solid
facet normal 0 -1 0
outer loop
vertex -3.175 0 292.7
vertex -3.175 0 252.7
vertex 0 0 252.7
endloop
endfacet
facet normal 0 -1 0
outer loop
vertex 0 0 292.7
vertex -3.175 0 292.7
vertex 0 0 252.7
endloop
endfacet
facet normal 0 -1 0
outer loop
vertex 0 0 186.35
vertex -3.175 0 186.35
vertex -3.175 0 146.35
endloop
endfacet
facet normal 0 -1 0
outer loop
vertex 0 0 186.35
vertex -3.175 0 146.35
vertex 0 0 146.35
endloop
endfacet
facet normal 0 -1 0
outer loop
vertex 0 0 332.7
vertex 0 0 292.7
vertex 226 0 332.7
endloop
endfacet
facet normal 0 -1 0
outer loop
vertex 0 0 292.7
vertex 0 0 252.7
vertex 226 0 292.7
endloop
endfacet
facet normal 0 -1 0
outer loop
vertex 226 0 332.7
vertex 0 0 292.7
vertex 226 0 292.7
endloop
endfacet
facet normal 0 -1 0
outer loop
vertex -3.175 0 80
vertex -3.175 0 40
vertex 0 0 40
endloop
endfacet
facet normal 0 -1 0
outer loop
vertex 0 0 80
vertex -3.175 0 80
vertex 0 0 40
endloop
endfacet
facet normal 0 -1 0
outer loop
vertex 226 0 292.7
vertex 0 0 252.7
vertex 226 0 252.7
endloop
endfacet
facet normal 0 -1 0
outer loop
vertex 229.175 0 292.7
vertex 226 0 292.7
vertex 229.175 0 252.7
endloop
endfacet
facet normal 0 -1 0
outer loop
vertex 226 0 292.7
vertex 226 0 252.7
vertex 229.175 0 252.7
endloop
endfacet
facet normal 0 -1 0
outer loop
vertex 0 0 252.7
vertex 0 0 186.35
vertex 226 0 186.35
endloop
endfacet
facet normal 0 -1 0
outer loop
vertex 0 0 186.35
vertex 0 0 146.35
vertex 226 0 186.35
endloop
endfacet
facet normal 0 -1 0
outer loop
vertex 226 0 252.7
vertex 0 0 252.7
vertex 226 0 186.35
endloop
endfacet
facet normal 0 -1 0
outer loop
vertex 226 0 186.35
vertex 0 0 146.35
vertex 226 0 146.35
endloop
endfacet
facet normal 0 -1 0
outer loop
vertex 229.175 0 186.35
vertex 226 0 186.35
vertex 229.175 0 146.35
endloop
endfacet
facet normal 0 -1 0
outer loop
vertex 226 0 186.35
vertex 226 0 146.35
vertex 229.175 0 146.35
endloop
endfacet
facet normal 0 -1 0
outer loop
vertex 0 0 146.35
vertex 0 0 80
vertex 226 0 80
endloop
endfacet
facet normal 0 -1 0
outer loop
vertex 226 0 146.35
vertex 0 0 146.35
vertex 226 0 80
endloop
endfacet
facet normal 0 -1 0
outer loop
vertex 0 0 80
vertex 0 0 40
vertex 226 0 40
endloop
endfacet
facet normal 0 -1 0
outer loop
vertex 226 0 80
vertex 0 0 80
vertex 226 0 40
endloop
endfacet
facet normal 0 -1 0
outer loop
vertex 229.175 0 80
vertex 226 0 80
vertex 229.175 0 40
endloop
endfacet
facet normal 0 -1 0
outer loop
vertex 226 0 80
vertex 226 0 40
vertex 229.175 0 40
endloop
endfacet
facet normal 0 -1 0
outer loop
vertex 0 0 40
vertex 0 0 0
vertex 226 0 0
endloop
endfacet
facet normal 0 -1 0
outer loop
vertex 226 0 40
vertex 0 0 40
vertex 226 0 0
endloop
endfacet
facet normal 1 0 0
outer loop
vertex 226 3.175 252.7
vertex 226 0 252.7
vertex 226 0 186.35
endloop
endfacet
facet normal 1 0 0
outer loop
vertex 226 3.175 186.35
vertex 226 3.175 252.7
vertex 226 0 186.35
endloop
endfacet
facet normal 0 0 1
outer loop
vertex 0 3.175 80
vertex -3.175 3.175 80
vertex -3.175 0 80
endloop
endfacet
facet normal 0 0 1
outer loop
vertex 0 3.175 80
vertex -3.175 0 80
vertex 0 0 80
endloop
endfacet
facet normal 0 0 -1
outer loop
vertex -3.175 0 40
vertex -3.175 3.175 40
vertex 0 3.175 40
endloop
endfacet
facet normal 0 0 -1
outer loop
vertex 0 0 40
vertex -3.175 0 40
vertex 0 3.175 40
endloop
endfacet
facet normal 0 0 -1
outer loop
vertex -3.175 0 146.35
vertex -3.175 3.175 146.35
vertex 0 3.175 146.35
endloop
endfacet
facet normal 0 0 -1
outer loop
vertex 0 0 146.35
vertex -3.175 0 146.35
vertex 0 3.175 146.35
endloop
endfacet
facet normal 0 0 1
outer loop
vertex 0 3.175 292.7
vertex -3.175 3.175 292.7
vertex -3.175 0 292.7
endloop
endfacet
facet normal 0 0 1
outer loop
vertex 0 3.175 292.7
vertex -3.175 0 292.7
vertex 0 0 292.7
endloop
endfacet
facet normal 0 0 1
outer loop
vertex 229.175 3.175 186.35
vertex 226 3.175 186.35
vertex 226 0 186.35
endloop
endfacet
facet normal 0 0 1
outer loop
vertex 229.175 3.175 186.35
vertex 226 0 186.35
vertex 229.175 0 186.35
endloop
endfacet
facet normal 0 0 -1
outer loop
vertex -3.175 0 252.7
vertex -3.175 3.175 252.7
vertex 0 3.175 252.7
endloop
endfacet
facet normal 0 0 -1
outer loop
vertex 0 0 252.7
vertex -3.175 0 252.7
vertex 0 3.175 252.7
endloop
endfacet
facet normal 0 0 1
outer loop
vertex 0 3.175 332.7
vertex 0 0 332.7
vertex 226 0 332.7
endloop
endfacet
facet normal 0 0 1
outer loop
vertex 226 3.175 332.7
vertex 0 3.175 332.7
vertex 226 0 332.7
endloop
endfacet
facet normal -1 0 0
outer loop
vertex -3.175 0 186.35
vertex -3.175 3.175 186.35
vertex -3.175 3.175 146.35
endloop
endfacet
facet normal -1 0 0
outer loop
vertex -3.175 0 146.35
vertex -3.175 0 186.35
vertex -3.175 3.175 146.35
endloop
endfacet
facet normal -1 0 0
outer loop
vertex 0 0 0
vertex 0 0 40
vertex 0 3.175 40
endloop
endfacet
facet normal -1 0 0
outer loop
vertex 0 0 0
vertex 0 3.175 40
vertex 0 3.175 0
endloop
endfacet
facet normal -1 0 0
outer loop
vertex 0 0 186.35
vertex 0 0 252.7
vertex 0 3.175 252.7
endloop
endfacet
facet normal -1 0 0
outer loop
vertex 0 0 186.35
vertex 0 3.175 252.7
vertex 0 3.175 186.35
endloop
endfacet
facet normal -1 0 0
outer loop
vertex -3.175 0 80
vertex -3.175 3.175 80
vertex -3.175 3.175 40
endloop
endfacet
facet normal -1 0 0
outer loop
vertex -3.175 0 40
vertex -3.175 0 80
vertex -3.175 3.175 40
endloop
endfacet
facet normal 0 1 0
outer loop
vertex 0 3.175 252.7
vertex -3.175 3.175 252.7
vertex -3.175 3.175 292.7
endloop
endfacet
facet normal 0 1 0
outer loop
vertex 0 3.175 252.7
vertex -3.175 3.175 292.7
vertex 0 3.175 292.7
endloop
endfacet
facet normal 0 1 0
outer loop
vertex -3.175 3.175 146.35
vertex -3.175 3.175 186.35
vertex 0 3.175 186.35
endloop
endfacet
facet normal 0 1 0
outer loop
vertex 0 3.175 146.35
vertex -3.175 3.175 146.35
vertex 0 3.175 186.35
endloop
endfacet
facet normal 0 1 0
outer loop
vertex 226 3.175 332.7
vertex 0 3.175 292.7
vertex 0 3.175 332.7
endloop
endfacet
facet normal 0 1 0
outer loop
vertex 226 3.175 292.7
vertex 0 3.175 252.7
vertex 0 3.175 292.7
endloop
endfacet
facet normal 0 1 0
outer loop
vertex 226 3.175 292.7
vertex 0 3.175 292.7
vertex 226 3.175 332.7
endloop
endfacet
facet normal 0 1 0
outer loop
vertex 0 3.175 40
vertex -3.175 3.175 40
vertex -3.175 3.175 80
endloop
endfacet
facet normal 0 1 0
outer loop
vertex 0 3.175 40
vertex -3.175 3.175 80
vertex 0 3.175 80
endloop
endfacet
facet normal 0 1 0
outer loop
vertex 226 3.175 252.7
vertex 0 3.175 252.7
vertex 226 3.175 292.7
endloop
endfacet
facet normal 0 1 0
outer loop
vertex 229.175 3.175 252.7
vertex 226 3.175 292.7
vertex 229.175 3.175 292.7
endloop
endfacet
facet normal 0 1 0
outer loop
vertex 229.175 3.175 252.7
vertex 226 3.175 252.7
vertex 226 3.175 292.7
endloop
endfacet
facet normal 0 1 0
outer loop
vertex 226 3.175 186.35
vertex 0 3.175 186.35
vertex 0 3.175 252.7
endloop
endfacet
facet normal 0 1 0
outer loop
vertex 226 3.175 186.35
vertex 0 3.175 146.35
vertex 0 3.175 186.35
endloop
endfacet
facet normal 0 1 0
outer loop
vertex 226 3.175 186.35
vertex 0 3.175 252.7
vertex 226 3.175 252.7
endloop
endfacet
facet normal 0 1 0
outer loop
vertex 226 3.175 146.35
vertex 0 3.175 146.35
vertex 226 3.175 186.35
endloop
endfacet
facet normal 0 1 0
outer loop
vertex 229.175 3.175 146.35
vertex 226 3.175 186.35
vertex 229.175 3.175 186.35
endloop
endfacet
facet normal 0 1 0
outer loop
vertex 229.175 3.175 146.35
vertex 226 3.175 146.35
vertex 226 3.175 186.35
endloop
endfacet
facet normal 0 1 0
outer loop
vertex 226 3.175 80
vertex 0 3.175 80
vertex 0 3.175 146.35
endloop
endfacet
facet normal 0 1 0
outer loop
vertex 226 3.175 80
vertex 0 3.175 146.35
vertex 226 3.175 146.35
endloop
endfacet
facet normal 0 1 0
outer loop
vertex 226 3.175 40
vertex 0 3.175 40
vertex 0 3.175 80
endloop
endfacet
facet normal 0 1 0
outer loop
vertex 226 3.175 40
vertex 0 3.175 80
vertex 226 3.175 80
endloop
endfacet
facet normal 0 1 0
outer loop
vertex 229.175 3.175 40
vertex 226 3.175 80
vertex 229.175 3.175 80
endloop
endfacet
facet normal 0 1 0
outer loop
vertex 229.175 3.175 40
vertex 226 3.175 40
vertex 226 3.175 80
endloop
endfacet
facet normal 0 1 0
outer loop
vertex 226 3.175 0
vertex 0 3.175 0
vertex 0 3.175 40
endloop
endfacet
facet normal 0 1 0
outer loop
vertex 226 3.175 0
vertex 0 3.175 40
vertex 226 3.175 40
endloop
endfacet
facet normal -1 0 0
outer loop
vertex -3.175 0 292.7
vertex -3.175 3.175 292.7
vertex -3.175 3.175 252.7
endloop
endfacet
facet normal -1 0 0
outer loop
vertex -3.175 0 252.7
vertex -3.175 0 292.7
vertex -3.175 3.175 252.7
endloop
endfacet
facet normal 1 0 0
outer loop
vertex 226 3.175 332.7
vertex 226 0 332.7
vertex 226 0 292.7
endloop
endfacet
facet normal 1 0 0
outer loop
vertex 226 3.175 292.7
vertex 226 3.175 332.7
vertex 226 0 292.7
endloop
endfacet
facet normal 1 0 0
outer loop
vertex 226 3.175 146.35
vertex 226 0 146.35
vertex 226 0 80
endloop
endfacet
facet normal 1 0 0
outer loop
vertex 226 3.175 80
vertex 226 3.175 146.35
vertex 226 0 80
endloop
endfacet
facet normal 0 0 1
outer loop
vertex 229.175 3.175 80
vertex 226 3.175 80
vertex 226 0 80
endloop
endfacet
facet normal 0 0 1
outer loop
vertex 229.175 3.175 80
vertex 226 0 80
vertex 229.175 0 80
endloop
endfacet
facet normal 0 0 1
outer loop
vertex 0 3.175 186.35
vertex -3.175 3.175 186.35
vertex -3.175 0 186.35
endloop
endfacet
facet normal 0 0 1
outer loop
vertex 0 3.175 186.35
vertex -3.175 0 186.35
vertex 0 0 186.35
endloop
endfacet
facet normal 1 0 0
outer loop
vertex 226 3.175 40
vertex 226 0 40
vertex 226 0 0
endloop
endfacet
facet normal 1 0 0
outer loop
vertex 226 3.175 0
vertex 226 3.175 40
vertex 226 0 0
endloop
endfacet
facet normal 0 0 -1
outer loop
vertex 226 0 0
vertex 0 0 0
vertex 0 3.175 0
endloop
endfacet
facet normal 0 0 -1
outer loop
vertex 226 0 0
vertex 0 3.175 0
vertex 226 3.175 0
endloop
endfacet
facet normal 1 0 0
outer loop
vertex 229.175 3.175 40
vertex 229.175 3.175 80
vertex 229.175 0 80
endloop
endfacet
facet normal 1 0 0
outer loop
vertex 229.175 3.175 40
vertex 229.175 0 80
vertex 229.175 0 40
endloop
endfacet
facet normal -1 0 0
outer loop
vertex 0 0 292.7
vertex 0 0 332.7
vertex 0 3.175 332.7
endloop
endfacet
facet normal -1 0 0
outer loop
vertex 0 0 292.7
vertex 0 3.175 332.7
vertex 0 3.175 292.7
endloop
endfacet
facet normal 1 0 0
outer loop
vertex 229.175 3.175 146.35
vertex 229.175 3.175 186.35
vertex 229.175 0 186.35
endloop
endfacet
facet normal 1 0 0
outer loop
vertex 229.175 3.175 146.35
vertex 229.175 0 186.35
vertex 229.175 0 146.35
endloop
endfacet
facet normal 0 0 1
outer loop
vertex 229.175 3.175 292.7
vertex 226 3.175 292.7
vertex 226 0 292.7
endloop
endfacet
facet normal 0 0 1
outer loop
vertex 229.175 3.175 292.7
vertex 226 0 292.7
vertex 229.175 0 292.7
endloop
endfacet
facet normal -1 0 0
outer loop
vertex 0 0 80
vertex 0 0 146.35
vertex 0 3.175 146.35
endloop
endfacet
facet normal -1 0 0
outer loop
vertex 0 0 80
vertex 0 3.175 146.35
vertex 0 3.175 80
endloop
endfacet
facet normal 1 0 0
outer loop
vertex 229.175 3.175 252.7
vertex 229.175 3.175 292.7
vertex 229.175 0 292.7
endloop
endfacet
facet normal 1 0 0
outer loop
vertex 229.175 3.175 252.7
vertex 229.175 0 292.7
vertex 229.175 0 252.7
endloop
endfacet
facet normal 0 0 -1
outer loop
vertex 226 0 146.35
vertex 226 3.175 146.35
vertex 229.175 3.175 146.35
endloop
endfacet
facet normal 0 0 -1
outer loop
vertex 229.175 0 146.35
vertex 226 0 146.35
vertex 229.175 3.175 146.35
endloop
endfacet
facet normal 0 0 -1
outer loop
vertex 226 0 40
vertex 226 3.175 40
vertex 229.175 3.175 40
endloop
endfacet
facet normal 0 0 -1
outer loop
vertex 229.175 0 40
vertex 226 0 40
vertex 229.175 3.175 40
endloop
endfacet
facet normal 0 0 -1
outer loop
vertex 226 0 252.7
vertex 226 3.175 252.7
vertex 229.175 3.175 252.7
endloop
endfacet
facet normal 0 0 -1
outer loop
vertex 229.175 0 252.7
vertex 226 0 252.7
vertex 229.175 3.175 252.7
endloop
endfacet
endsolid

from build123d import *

# Parameters (mm, degrees)
SKETCH1_W           = 226
SKETCH1_H           = 332.7
BOSS_EXTRUDE1_DEPTH = 3.175
SKETCH2_W           = 3.175
SKETCH2_H           = 40
BOSS_EXTRUDE2_DEPTH = 3.175
LPATTERN1_COUNT     = 3
LPATTERN1_PITCH     = 106.35


with BuildPart() as part:
    # Sketch1 → Boss-Extrude1 (new body)
    with BuildSketch(Plane(origin=(0, 0, 0), x_dir=(1, 0, 0), z_dir=(0, 1, 0))):
        with Locations((113, -166.35)):
            Rectangle(SKETCH1_W, SKETCH1_H)
    extrude(amount=BOSS_EXTRUDE1_DEPTH)

    # Sketch2 → Boss-Extrude2 (add)
    with BuildSketch(Plane(origin=(0, 3.175, 0), x_dir=(1, 0, 0), z_dir=(0, 1, 0))):
        with Locations((-1.5875, -60)):
            Rectangle(SKETCH2_W, SKETCH2_H)
        with Locations((227.5875, -60)):
            Rectangle(SKETCH2_W, SKETCH2_H)
    boss_extrude2 = extrude(amount=-BOSS_EXTRUDE2_DEPTH)

    # LPattern1: Boss-Extrude2 ×3
    with Locations(*[(0, 0, i * LPATTERN1_PITCH) for i in range(1, LPATTERN1_COUNT)]):
        add(boss_extrude2)


solid = part.part
